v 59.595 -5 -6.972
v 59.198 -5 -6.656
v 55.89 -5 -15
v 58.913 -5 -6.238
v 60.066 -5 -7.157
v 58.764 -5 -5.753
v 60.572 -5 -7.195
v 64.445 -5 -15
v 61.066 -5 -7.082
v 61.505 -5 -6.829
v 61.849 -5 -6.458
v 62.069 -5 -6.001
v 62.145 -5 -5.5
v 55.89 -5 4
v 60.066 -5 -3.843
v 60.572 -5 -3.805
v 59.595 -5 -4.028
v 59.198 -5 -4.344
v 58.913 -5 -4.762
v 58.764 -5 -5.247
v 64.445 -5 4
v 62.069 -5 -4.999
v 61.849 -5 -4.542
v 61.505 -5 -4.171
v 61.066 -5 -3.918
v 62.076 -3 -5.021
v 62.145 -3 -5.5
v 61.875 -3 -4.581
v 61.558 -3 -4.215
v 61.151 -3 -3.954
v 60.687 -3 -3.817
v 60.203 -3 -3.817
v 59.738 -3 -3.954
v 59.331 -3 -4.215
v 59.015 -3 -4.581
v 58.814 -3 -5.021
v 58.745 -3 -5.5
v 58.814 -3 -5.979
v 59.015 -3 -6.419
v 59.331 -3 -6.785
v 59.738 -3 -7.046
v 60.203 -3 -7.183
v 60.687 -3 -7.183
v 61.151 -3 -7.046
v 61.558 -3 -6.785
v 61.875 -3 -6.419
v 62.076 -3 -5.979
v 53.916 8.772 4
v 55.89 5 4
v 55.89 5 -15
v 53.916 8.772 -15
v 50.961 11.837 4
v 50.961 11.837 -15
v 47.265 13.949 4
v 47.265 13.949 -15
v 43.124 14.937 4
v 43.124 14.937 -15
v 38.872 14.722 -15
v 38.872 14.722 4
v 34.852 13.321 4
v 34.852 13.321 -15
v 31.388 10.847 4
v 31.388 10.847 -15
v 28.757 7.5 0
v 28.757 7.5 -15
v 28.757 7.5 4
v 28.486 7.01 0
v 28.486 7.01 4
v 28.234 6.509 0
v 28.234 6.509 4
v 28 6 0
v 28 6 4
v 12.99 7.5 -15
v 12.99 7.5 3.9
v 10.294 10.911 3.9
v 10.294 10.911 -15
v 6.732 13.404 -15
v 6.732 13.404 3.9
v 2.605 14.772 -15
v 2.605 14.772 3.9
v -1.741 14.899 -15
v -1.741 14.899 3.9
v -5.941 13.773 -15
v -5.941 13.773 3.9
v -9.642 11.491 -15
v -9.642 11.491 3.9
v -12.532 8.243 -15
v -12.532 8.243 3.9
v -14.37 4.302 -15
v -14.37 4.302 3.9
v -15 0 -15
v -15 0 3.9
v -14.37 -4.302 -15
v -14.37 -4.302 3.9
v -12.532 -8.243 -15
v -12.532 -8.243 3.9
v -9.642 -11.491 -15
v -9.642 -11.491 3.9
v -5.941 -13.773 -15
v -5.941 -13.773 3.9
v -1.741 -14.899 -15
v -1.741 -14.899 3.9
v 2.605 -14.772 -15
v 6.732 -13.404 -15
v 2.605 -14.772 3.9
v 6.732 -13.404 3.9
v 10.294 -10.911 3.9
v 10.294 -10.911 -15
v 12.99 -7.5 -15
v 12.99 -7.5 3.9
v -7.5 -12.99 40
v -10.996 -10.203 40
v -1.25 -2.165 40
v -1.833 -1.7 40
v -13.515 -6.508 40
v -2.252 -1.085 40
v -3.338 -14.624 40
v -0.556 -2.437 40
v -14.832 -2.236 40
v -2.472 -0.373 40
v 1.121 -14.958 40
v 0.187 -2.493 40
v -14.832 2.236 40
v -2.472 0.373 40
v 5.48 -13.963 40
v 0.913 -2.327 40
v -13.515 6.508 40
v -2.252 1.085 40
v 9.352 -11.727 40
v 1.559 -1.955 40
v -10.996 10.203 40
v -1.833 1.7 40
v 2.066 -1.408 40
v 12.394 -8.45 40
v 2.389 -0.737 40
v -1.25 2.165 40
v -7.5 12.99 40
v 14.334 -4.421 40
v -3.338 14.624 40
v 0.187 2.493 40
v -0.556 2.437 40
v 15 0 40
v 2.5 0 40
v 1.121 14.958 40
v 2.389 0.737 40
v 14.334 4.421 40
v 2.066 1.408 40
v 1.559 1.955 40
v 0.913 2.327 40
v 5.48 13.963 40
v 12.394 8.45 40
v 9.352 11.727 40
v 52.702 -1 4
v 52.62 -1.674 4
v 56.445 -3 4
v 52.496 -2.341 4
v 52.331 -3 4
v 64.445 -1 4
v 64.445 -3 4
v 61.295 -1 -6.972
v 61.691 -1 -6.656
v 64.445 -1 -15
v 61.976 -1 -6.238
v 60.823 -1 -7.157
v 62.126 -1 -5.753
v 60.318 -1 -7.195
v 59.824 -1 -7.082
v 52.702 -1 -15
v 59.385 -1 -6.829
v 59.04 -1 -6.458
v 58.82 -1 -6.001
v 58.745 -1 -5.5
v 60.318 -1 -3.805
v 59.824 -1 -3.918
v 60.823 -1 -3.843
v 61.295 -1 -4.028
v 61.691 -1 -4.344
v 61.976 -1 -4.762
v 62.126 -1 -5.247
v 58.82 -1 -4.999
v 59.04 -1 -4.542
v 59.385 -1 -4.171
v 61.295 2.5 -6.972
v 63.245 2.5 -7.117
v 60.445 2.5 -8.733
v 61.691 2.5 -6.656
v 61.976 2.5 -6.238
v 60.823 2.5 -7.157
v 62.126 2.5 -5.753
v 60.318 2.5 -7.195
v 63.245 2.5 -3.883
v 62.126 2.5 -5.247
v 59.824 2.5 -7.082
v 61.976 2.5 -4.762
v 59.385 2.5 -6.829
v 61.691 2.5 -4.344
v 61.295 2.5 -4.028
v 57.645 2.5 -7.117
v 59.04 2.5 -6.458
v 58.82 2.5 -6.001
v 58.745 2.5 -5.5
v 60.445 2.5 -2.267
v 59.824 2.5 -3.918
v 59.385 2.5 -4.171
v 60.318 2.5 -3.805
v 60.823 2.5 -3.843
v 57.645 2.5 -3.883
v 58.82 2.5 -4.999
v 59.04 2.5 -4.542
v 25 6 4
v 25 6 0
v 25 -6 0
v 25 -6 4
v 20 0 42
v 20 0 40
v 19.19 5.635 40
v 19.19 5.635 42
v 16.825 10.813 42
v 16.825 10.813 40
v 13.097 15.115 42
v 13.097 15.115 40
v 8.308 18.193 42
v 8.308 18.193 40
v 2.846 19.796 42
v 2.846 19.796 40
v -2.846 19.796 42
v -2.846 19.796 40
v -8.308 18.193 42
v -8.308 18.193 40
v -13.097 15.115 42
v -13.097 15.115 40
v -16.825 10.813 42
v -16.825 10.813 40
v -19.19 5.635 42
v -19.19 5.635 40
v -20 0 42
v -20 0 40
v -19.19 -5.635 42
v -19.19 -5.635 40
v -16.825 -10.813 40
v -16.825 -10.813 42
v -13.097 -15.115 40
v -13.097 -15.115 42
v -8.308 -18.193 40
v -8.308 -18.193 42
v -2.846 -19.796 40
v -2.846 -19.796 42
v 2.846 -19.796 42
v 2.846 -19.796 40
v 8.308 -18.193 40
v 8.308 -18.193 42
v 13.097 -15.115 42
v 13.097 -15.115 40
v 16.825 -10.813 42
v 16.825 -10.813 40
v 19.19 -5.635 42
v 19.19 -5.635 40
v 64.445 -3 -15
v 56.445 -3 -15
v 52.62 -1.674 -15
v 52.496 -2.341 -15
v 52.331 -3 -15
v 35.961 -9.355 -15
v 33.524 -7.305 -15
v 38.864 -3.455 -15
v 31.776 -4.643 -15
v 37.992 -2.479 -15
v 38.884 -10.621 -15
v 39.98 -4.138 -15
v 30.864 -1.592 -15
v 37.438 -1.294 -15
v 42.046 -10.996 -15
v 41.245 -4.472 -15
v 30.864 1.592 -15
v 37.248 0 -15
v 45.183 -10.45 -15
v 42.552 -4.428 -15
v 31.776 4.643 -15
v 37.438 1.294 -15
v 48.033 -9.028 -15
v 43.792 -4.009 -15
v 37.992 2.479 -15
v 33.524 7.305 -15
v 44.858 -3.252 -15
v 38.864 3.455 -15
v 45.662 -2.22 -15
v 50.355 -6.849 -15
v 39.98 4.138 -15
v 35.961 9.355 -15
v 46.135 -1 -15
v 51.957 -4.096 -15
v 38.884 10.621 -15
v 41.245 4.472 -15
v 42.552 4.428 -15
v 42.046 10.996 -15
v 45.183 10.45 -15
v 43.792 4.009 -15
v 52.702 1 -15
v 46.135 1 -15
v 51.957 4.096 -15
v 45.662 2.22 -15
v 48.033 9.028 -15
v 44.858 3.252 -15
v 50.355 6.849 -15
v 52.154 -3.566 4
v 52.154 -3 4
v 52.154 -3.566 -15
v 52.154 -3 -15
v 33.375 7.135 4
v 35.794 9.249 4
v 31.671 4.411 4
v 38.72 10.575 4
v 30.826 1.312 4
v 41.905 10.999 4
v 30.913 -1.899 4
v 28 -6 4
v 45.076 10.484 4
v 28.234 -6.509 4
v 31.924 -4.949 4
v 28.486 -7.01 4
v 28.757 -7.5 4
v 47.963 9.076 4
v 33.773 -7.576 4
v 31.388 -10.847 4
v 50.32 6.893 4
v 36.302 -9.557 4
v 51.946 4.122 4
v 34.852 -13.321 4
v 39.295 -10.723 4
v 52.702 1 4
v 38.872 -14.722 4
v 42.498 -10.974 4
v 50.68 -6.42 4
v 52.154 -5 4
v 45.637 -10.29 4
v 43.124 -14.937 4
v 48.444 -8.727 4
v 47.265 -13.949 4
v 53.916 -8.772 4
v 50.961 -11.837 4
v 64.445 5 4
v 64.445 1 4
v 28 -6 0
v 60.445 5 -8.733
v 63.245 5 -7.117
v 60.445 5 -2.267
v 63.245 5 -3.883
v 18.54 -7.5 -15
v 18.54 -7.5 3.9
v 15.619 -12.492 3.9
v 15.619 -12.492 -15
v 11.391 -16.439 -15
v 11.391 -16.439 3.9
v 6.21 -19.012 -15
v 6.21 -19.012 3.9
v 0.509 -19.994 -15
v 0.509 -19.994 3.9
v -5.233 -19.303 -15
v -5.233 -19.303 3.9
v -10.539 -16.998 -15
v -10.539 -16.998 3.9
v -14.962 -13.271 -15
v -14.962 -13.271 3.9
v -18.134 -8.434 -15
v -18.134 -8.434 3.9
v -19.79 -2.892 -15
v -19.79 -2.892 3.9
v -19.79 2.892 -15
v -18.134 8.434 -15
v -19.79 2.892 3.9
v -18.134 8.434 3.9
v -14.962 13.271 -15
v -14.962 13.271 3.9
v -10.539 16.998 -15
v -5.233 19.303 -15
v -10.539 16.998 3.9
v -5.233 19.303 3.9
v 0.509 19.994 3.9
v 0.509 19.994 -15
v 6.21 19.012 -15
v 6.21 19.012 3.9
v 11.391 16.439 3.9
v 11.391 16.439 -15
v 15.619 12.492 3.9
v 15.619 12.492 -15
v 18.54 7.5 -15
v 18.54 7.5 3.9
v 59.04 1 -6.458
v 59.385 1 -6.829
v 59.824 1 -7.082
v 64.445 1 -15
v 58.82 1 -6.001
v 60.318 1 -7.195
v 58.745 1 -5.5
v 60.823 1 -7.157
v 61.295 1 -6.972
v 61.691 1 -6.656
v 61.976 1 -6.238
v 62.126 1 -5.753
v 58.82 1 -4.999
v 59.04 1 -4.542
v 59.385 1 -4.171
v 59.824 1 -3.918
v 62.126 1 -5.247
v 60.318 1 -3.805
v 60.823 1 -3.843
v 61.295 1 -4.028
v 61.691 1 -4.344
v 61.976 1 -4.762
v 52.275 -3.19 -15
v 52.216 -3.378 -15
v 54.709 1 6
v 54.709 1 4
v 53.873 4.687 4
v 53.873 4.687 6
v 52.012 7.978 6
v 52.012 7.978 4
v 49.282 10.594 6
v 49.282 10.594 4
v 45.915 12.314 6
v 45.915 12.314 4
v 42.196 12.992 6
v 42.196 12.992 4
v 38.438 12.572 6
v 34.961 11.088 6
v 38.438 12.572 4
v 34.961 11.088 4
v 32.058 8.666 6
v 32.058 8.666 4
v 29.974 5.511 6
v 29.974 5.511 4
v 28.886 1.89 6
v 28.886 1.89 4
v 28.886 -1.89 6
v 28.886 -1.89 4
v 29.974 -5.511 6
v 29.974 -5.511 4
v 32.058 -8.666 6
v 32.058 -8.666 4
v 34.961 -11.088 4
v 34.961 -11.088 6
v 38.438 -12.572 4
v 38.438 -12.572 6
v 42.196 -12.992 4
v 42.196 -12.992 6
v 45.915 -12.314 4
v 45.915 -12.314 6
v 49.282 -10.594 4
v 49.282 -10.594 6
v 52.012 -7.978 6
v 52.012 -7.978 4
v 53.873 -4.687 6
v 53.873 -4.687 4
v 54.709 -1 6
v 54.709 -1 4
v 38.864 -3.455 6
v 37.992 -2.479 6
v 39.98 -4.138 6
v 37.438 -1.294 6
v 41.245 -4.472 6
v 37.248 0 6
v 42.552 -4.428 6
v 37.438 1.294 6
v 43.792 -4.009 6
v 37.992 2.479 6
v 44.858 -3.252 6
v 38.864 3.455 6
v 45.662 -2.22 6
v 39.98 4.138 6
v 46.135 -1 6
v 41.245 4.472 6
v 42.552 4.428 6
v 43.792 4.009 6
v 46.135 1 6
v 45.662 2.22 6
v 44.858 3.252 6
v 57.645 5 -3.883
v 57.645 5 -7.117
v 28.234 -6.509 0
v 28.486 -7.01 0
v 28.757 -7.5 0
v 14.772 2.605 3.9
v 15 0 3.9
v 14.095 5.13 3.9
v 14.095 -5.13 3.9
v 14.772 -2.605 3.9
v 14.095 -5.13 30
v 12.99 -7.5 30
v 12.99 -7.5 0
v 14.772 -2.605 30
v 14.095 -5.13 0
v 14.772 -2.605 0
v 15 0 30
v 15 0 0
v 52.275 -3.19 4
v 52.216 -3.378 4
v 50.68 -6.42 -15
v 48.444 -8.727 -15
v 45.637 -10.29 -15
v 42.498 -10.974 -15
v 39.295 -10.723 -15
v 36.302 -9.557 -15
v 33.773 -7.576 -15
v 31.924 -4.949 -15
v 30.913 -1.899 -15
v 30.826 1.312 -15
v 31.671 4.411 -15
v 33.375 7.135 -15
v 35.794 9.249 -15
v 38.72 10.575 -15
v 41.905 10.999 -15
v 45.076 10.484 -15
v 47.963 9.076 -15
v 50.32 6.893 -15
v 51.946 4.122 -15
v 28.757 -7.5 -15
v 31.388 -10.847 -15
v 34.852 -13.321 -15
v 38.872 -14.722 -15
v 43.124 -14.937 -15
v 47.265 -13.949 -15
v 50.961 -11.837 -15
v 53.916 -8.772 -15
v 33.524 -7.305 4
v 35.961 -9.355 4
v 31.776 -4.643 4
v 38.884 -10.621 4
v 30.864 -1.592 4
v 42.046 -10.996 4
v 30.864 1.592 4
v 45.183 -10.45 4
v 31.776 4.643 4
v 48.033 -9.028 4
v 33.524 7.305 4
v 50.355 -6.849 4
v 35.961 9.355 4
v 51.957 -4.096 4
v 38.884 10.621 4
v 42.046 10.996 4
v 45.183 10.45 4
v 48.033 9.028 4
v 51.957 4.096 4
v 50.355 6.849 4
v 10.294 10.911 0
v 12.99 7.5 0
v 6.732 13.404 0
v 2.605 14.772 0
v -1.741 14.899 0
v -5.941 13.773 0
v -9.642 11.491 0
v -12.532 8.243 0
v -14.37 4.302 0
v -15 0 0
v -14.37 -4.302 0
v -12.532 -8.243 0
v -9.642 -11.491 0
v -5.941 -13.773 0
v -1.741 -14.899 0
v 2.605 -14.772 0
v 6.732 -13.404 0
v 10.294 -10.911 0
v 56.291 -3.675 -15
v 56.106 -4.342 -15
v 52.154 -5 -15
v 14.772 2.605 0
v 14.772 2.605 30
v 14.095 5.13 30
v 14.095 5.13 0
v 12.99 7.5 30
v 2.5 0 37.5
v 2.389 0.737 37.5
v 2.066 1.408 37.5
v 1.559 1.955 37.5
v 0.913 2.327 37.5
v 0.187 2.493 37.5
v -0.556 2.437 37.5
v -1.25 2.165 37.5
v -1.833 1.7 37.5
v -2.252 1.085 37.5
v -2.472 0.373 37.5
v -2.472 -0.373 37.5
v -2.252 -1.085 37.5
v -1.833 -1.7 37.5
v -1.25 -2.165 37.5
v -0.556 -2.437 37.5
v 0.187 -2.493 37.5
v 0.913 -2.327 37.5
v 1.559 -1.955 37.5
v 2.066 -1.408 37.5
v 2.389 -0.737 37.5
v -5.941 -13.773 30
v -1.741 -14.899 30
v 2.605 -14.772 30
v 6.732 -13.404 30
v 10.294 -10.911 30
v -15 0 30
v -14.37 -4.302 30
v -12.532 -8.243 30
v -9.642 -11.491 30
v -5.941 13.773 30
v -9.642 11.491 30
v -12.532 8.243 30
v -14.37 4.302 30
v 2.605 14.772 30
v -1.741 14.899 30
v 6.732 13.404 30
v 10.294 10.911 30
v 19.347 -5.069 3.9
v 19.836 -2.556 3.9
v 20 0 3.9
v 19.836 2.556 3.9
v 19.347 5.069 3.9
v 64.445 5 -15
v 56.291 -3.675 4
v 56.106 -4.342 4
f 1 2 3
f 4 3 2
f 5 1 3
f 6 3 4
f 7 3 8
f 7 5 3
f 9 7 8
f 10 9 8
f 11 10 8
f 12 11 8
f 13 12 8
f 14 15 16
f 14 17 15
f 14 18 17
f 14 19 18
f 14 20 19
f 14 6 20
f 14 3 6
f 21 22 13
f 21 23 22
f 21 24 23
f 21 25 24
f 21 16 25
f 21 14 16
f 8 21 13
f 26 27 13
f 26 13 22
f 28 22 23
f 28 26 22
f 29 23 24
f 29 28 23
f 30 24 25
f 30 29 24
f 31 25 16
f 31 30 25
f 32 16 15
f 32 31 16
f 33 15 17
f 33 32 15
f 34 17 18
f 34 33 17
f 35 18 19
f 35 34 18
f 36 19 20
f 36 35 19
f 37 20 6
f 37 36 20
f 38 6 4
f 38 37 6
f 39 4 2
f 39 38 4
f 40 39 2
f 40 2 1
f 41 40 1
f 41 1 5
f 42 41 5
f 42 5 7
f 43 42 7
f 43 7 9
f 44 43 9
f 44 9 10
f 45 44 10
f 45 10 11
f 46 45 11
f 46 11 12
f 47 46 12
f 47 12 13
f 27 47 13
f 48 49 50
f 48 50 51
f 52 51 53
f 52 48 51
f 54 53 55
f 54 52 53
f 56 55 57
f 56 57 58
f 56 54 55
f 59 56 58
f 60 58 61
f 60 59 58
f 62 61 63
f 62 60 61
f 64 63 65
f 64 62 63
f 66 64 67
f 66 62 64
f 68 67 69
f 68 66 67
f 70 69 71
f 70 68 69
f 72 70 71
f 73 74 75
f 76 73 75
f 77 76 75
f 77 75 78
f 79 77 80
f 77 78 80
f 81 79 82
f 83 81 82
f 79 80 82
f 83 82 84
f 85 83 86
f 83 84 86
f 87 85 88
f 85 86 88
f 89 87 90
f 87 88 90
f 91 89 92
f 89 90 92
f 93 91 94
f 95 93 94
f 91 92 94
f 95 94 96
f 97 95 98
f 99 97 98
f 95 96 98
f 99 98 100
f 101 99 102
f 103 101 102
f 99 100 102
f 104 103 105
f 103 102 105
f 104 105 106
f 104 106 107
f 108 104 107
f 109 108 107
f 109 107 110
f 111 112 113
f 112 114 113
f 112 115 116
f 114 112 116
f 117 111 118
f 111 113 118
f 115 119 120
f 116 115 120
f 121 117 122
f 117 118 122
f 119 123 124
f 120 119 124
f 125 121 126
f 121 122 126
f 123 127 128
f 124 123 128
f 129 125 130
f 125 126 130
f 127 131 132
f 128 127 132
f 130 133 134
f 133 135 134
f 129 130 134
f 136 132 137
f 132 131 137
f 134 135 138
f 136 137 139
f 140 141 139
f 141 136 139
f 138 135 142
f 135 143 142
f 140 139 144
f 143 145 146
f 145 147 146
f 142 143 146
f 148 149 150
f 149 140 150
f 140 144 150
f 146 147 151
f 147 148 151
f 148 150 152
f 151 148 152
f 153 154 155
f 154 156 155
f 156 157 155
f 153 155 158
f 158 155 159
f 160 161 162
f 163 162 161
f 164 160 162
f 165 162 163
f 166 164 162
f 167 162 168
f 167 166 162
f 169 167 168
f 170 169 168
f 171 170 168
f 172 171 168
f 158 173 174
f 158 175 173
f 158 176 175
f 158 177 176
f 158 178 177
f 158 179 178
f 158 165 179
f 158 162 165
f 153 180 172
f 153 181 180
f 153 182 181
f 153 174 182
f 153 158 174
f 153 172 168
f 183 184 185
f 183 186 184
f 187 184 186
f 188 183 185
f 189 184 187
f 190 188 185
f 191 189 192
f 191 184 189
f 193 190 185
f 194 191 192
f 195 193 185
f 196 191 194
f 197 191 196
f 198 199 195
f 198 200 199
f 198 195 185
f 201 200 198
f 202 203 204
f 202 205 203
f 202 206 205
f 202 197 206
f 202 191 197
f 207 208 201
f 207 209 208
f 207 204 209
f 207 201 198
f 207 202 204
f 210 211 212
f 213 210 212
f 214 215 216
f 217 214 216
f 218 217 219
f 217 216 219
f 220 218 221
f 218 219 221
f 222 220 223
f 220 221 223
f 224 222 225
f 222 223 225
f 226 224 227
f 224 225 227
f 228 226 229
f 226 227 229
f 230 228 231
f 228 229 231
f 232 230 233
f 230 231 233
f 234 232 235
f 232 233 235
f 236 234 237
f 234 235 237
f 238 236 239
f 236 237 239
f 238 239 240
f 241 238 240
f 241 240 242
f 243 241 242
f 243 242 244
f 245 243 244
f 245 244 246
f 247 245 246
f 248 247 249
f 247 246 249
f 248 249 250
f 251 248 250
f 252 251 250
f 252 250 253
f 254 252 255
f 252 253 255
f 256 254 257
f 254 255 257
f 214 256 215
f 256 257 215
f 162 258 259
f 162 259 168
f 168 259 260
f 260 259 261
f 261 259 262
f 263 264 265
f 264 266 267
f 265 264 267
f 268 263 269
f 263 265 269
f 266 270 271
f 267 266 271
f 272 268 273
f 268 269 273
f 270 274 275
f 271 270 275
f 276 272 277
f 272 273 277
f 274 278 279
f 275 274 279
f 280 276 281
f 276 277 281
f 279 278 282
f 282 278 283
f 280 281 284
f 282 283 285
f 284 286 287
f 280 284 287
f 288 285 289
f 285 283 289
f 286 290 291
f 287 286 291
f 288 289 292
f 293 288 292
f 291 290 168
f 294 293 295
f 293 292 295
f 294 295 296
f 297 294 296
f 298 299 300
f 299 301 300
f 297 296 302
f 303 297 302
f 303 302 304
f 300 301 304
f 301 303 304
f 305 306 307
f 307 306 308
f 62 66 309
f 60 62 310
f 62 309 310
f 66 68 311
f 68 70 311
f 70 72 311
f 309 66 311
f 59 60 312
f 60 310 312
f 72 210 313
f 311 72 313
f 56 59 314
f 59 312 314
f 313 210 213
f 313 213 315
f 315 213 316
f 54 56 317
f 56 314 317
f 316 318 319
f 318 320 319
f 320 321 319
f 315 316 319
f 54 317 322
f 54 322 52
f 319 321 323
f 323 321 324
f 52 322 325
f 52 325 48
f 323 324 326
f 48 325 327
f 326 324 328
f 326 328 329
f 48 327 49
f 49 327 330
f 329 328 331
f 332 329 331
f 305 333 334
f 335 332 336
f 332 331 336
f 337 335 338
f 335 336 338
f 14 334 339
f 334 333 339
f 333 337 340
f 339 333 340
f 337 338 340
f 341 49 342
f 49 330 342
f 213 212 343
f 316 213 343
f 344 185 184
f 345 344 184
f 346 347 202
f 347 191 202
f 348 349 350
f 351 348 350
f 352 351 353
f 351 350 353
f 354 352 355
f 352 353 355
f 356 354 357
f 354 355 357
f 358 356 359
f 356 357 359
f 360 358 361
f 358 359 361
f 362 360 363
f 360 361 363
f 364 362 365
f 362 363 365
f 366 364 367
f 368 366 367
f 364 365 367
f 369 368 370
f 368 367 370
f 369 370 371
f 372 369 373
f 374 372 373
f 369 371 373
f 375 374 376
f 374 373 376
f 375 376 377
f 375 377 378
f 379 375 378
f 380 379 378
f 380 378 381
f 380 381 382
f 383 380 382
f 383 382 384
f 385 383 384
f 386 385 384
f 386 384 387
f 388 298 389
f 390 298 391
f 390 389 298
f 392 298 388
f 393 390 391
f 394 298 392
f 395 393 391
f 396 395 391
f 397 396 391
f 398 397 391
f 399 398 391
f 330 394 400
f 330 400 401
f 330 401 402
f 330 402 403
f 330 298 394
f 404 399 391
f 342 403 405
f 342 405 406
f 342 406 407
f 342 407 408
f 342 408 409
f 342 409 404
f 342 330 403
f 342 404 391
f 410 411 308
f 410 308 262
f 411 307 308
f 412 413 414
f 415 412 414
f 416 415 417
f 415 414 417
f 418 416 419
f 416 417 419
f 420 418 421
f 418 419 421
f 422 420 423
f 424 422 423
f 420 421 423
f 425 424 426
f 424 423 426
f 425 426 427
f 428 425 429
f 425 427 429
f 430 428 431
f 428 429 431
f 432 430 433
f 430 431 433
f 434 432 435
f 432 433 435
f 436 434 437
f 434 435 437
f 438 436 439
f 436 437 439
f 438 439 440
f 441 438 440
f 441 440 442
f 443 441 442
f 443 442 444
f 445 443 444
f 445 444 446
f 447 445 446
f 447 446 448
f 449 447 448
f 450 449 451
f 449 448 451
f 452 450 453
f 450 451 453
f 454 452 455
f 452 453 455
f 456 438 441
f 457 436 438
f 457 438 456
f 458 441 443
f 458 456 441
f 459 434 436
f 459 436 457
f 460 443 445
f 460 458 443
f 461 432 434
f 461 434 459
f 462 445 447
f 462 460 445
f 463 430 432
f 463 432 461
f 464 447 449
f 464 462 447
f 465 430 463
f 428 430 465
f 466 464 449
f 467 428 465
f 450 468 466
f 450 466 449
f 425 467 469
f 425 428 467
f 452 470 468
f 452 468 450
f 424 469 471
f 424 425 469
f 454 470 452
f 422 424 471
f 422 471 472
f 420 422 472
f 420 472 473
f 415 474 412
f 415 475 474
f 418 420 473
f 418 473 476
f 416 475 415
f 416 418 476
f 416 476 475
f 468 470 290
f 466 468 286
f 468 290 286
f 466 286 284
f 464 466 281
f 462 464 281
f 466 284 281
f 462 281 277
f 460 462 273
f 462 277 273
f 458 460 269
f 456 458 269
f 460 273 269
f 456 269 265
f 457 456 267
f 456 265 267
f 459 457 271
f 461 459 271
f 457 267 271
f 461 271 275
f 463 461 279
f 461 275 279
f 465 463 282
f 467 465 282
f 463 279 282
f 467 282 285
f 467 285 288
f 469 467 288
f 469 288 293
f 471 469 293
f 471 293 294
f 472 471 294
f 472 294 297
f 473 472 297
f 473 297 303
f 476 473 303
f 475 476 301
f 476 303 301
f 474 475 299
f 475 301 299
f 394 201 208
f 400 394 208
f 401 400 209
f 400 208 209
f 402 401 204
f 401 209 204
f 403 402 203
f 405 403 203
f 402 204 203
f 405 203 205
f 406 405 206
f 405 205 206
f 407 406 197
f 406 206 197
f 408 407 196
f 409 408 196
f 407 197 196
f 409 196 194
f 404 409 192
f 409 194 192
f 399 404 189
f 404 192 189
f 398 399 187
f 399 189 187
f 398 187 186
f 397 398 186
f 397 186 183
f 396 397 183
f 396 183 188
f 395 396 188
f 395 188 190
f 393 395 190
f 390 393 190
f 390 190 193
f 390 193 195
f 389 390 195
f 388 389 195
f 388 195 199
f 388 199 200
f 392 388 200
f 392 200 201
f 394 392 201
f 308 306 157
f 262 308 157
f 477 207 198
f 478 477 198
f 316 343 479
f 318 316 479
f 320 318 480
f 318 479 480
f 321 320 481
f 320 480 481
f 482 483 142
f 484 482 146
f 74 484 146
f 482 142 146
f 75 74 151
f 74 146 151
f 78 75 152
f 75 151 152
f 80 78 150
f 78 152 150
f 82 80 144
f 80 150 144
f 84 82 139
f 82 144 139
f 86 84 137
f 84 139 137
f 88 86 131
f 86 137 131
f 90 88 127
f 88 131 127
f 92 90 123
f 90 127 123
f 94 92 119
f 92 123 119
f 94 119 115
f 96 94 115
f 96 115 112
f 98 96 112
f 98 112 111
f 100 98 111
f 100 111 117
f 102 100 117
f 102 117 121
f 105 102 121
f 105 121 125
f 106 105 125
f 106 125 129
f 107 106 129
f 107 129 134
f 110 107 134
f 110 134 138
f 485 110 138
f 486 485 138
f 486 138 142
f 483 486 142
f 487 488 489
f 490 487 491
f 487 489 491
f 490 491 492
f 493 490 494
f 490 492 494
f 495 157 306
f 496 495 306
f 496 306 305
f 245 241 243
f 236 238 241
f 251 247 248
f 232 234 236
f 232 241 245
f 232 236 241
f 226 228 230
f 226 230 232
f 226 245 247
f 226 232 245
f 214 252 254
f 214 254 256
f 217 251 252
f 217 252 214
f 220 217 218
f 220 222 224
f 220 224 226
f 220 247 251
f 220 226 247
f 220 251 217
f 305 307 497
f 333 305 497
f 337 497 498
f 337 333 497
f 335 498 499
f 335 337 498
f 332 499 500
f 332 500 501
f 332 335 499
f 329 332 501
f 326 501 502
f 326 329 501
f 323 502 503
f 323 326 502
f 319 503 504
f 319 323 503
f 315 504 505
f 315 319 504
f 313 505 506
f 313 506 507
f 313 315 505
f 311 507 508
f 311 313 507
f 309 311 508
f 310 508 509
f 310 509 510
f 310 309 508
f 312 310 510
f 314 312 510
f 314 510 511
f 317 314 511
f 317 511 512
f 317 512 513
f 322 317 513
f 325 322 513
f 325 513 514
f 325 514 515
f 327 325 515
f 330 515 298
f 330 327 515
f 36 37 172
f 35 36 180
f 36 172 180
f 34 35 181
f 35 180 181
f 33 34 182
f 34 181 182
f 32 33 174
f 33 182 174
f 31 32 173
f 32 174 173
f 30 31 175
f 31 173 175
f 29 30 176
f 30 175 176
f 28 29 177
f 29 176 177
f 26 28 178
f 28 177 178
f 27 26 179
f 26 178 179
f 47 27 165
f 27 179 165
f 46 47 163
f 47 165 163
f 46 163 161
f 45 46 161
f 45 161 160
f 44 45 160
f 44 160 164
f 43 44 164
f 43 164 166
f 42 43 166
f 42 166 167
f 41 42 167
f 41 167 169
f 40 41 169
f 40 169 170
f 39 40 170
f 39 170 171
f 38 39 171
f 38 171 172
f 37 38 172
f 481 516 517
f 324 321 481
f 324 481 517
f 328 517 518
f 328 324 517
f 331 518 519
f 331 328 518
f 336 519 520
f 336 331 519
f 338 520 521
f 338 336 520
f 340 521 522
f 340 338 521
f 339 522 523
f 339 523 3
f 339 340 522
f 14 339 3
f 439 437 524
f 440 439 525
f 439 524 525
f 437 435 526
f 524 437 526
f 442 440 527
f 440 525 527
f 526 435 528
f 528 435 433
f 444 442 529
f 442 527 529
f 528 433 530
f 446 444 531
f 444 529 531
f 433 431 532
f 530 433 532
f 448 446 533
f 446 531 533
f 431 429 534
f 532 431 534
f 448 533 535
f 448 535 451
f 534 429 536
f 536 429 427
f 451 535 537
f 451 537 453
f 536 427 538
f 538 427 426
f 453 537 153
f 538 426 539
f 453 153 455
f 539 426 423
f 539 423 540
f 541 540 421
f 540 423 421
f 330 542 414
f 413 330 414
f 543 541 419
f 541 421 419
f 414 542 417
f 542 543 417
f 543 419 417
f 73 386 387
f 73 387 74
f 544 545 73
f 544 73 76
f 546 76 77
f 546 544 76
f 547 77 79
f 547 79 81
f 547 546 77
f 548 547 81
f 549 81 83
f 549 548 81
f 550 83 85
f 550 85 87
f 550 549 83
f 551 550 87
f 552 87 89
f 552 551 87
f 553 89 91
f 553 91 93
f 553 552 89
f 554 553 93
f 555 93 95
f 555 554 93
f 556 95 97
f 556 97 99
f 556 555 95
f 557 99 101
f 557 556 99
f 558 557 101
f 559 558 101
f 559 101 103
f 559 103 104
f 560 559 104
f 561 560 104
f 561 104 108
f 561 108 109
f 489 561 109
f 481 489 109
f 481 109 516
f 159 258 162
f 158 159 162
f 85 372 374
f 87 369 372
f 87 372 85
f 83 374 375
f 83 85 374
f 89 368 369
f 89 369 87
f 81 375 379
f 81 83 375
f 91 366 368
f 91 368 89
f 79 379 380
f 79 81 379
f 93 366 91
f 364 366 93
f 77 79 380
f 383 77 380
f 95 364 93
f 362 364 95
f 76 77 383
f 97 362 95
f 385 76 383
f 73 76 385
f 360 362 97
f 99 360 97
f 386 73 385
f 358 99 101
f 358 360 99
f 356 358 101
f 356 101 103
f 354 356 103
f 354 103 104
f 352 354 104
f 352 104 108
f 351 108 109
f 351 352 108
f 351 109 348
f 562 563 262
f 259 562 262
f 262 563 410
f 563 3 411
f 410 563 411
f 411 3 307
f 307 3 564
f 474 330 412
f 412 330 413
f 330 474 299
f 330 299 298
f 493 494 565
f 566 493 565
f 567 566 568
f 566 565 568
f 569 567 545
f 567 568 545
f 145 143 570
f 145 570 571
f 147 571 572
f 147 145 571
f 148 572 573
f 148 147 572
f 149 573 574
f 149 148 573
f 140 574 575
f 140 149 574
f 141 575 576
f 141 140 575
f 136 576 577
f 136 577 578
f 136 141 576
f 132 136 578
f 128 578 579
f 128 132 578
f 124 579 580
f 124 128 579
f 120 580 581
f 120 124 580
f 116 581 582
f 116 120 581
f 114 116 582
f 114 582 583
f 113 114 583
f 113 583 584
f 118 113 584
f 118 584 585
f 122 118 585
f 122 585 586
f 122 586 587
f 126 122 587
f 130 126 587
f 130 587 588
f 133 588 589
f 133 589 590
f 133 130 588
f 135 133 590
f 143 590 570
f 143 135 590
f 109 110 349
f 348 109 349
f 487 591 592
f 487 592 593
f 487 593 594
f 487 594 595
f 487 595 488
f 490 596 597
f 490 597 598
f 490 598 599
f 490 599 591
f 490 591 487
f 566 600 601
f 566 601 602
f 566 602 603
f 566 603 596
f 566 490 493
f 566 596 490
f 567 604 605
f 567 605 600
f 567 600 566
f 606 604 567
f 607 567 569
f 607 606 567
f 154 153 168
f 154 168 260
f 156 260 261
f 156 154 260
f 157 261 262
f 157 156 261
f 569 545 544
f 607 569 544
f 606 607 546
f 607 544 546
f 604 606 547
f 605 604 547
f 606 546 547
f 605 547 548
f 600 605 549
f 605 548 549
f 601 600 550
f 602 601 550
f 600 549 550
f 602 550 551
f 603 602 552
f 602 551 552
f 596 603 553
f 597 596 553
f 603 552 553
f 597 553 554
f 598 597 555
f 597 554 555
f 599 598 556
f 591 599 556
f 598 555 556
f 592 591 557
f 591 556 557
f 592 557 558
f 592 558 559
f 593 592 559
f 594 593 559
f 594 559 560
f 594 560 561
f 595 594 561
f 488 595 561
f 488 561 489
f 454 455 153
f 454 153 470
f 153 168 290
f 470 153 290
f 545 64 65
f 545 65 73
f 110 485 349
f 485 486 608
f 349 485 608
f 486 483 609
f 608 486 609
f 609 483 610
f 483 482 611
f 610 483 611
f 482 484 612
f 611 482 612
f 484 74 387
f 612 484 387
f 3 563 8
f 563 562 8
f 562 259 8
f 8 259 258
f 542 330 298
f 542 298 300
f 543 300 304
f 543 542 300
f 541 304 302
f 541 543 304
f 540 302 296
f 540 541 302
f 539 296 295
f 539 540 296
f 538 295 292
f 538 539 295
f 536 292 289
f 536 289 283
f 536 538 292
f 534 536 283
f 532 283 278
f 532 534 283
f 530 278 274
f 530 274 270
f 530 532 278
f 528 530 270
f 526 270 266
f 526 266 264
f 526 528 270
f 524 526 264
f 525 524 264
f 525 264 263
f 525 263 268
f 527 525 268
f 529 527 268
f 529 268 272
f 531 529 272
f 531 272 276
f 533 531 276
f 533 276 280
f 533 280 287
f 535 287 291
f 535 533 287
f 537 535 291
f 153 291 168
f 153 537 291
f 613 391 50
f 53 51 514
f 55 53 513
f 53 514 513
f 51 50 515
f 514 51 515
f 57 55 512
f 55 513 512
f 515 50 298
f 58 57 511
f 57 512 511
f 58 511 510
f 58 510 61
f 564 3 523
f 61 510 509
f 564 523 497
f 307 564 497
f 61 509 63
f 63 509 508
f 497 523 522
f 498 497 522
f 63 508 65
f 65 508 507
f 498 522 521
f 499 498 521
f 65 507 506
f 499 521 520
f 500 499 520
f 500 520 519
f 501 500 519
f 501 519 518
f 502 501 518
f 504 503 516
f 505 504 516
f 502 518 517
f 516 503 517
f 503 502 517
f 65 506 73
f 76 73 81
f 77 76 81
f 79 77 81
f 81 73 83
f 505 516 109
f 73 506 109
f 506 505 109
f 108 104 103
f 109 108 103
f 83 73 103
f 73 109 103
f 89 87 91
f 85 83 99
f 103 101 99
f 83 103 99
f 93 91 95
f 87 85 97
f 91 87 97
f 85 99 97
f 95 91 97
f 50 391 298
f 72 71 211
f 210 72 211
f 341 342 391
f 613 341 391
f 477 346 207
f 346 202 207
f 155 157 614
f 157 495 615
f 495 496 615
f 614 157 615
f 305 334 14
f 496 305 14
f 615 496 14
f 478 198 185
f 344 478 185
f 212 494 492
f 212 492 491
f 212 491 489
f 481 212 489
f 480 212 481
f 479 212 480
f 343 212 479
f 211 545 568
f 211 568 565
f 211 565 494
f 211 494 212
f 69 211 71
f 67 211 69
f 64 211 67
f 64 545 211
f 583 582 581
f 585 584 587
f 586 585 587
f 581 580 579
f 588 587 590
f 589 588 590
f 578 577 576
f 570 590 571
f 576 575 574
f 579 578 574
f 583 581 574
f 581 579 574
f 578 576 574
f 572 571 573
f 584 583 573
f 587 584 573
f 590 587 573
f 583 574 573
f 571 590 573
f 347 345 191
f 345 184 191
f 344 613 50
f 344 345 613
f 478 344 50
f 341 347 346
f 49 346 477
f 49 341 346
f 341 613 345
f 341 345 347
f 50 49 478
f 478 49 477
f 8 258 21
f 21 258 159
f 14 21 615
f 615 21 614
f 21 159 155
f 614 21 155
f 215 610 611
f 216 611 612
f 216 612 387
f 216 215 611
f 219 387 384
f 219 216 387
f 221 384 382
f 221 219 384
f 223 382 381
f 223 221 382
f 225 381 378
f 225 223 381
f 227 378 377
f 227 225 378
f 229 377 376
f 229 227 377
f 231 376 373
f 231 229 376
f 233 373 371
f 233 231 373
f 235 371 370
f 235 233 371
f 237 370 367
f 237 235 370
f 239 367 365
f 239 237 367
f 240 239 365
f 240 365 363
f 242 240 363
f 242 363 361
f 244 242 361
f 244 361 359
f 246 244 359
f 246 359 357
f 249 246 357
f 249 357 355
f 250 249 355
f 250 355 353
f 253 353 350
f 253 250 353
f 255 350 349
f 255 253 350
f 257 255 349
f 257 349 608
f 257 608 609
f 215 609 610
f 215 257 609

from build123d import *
from build123d import SkipClean  # not in build123d's __all__

# Parameters (mm, degrees)
F1_DEPTH      = 4
F2_DEPTH      = 15
F3_DEPTH      = 30
F3_DEPTH_BACK = 15
F4_R          = 1.7
F5_DEPTH      = 0.5
F6_DEPTH      = 6
F8_DEPTH      = 19
F9_DEPTH      = 2
F11_DEPTH     = 2
F12_R         = 1.7
F13_DEPTH     = 2
F15_R         = 2.5
F16_DEPTH     = 2.5
F15_R_2       = 20
F15_R_3       = 15
F17_DEPTH     = 36.1
F18_DEPTH     = 2
F20_DEPTH     = 18.9


with BuildPart() as f1:
    # F0 (on Top) → F1 (new body)
    with BuildSketch(Plane.XY):
        with BuildLine():
            ThreePointArc((28, -6), (26.7477270849, 0), (28, 6))
            Line((28, 6), (25, 6))
            Line((25, 6), (25, 0))
            Line((25, 0), (25, -6))
            Line((25, -6), (28, -6))
        make_face()
        with BuildLine():
            ThreePointArc((52.702178235, -1), (30.7477270849, 0), (52.702178235, 1))
            Line((52.702178235, 1), (56.4446655416, 1))
            Line((56.4446655416, 1), (64.4446655416, 1))
            Line((64.4446655416, 1), (64.4446655416, 3))
            Line((64.4446655416, 3), (56.4446655416, 3))
            ThreePointArc((56.4446655416, 3), (44.1540904281, 14.805722389), (28.7573460281, 7.5))
            ThreePointArc((28.7573460281, 7.5), (28.3576521505, 6.7606133784), (28, 6))
            ThreePointArc((28, 6), (26.7477270849, 0), (28, -6))
            ThreePointArc((28, -6), (28.3576521505, -6.7606133784), (28.7573460281, -7.5))
            ThreePointArc((28.7573460281, -7.5), (44.1540904281, -14.805722389), (56.4446655416, -3))
            Line((56.4446655416, -3), (64.4446655416, -3))
            Line((64.4446655416, -3), (64.4446655416, -1))
            Line((64.4446655416, -1), (56.4446655416, -1))
            Line((56.4446655416, -1), (52.702178235, -1))
        make_face()
    extrude(amount=F1_DEPTH)

    # F0 (on Top) → F2 (join)
    with BuildSketch(Plane.XY):
        with BuildLine():
            ThreePointArc((52.702178235, -1), (30.7477270849, 0), (52.702178235, 1))
            Line((52.702178235, 1), (56.4446655416, 1))
            Line((56.4446655416, 1), (64.4446655416, 1))
            Line((64.4446655416, 1), (64.4446655416, 3))
            Line((64.4446655416, 3), (56.4446655416, 3))
            ThreePointArc((56.4446655416, 3), (44.1540904281, 14.805722389), (28.7573460281, 7.5))
            ThreePointArc((28.7573460281, 7.5), (28.3576521505, 6.7606133784), (28, 6))
            ThreePointArc((28, 6), (26.7477270849, 0), (28, -6))
            ThreePointArc((28, -6), (28.3576521505, -6.7606133784), (28.7573460281, -7.5))
            ThreePointArc((28.7573460281, -7.5), (44.1540904281, -14.805722389), (56.4446655416, -3))
            Line((56.4446655416, -3), (64.4446655416, -3))
            Line((64.4446655416, -3), (64.4446655416, -1))
            Line((64.4446655416, -1), (56.4446655416, -1))
            Line((56.4446655416, -1), (52.702178235, -1))
        make_face()
        with BuildLine():
            ThreePointArc((28, -6), (26.7477270849, 0), (28, 6))
            Line((28, 6), (25, 6))
            Line((25, 6), (25, 0))
            Line((25, 0), (25, -6))
            Line((25, -6), (28, -6))
        make_face()
        with BuildLine():
            ThreePointArc((28, 6), (28.3576521505, 6.7606133784), (28.7573460281, 7.5))
            Line((28.7573460281, 7.5), (12.9903810568, 7.5))
            ThreePointArc((12.9903810568, 7.5), (14.4888873943, 3.8822856765), (15, 0))
            ThreePointArc((15, 0), (14.4888873943, -3.8822856765), (12.9903810568, -7.5))
            Line((12.9903810568, -7.5), (28.7573460281, -7.5))
            ThreePointArc((28.7573460281, -7.5), (28.3576521505, -6.7606133784), (28, -6))
            Line((28, -6), (25, -6))
            Line((25, -6), (25, 0))
            Line((25, 0), (25, 6))
            Line((25, 6), (28, 6))
        make_face()
    extrude(amount=-F2_DEPTH)

    # F0 (on Top) → F3 (join, two sides)
    with BuildSketch(Plane.XY) as f3_sk:
        with BuildLine():
            ThreePointArc((15, 0), (14.4888873943, 3.8822856765), (12.9903810568, 7.5))
            ThreePointArc((12.9903810568, 7.5), (-15, 0), (12.9903810568, -7.5))
            ThreePointArc((12.9903810568, -7.5), (14.4888873943, -3.8822856765), (15, 0))
        make_face()
    extrude(amount=F3_DEPTH)
    extrude(f3_sk.sketch, amount=-F3_DEPTH_BACK)

    # F4 (on face) → F5 (cut)
    with BuildSketch(Plane(origin=(0, 3, 0), x_dir=(-1, 0, 0), z_dir=(0, 1, 0))):
        Polygon((-63.2446655416, -7.1165807537), (-60.4446655416, -8.7331615075), (-57.6446655416, -7.1165807537), (-57.6446655416, -3.8834192463), (-60.4446655416, -2.2668384925), (-63.2446655416, -3.8834192463), align=None)
        with Locations((-60.4446655416, -5.5)):
            Circle(F4_R, mode=Mode.SUBTRACT)
    extrude(amount=-F5_DEPTH, mode=Mode.SUBTRACT)

    # F6 (cut, through all): a face of the model
    f6_faces = [f1.faces().sort_by_distance(p)[0] for p in [
        (60.4446655416, 3, -5.5),
    ]]
    extrude(f6_faces, amount=-F6_DEPTH, mode=Mode.SUBTRACT)

    # F10 (on face) → F11 (join)
    with BuildSketch(Plane(origin=(0, 3, 0), x_dir=(-1, 0, 0), z_dir=(0, 1, 0))):
        Polygon((-64.4446655416, -15), (-56.4446655416, -15), (-52.5044240057, -15), (-52.5044240057, 4), (-56.4446655416, 4), (-64.4446655416, 4), align=None)
        Polygon((-63.2446655416, -7.1165807537), (-63.2446655416, -3.8834192463), (-60.4446655416, -2.2668384925), (-57.6446655416, -3.8834192463), (-57.6446655416, -7.1165807537), (-60.4446655416, -8.7331615075), align=None, mode=Mode.SUBTRACT)
    extrude(amount=F11_DEPTH)

    # F12 (on face) → F13 (join)
    with BuildSketch(Plane.XZ.offset(3)):
        Polygon((64.4446655416, 4), (56.4446655416, 4), (52.1536841989, 4), (52.1536841989, -15), (56.4446655416, -15), (64.4446655416, -15), align=None)
        with Locations((60.4446655416, -5.5)):
            Circle(F12_R, mode=Mode.SUBTRACT)
    with SkipClean():  # cleaning this boolean's faces spoils the solid; the shape is the same uncleaned
        extrude(amount=F13_DEPTH)


with BuildPart() as f8:
    # F7 (on face) → F8 (new body, through all)
    with BuildSketch(Plane.XY.offset(4)):
        with BuildLine():
            Line((46.1352092786, 1), (52.702178235, 1))
            ThreePointArc((52.702178235, 1), (30.7477270849, 0), (52.702178235, -1))
            Line((52.702178235, -1), (46.1352092786, -1))
            ThreePointArc((46.1352092786, -1), (37.2477270849, 0), (46.1352092786, 1))
        make_face()
    extrude(amount=-F8_DEPTH)

    # F7 (on face) → F9 (join)
    with BuildSketch(Plane.XY.offset(4)):
        with BuildLine():
            Line((46.1352092786, 1), (52.702178235, 1))
            ThreePointArc((52.702178235, 1), (30.7477270849, 0), (52.702178235, -1))
            Line((52.702178235, -1), (46.1352092786, -1))
            ThreePointArc((46.1352092786, -1), (37.2477270849, 0), (46.1352092786, 1))
        make_face()
        with BuildLine():
            ThreePointArc((52.702178235, -1), (30.7477270849, 0), (52.702178235, 1))
            Line((52.702178235, 1), (54.7092084817, 1))
            ThreePointArc((54.7092084817, 1), (28.7477270849, 0), (54.7092084817, -1))
            Line((54.7092084817, -1), (52.702178235, -1))
        make_face()
    extrude(amount=F9_DEPTH)


with BuildPart() as f16:
    # F15 (on offset) → F16 (new body)
    with BuildSketch(Plane.XY.offset(40)):
        Circle(F15_R)
    extrude(amount=-F16_DEPTH)



with BuildPart() as f17:
    # F15 (on offset) → F17 (new body)
    with BuildSketch(Plane.XY.offset(40)):
        Circle(F15_R_2)
        Circle(F15_R_3, mode=Mode.SUBTRACT)
    extrude(amount=-F17_DEPTH)


with BuildPart() as f16_1:
    add(f16.part, clean=False)

    add(f17.part)  # F18 merges F17
    # F15 (on offset) → F18 (join)
    with BuildSketch(Plane.XY.offset(40)):
        Circle(F15_R_2)
        Circle(F15_R_3, mode=Mode.SUBTRACT)
        Circle(F15_R_3)
        Circle(F15_R, mode=Mode.SUBTRACT)
        Circle(F15_R)
    extrude(amount=F18_DEPTH)

    # F19 (on face) → F20 (join, through all)
    with BuildSketch(Plane(origin=(0, 0, 3.9), x_dir=(1, 0, 0), z_dir=(0, 0, -1))):
        with BuildLine():
            ThreePointArc((12.9903810568, -7.5), (-15, 0), (12.9903810568, 7.5))
            Line((12.9903810568, 7.5), (18.5404962177, 7.5))
            ThreePointArc((18.5404962177, 7.5), (-20, 0), (18.5404962177, -7.5))
            Line((18.5404962177, -7.5), (12.9903810568, -7.5))
        make_face()
    extrude(amount=F20_DEPTH)


solid = Compound([f1.part, f8.part, f16_1.part])
